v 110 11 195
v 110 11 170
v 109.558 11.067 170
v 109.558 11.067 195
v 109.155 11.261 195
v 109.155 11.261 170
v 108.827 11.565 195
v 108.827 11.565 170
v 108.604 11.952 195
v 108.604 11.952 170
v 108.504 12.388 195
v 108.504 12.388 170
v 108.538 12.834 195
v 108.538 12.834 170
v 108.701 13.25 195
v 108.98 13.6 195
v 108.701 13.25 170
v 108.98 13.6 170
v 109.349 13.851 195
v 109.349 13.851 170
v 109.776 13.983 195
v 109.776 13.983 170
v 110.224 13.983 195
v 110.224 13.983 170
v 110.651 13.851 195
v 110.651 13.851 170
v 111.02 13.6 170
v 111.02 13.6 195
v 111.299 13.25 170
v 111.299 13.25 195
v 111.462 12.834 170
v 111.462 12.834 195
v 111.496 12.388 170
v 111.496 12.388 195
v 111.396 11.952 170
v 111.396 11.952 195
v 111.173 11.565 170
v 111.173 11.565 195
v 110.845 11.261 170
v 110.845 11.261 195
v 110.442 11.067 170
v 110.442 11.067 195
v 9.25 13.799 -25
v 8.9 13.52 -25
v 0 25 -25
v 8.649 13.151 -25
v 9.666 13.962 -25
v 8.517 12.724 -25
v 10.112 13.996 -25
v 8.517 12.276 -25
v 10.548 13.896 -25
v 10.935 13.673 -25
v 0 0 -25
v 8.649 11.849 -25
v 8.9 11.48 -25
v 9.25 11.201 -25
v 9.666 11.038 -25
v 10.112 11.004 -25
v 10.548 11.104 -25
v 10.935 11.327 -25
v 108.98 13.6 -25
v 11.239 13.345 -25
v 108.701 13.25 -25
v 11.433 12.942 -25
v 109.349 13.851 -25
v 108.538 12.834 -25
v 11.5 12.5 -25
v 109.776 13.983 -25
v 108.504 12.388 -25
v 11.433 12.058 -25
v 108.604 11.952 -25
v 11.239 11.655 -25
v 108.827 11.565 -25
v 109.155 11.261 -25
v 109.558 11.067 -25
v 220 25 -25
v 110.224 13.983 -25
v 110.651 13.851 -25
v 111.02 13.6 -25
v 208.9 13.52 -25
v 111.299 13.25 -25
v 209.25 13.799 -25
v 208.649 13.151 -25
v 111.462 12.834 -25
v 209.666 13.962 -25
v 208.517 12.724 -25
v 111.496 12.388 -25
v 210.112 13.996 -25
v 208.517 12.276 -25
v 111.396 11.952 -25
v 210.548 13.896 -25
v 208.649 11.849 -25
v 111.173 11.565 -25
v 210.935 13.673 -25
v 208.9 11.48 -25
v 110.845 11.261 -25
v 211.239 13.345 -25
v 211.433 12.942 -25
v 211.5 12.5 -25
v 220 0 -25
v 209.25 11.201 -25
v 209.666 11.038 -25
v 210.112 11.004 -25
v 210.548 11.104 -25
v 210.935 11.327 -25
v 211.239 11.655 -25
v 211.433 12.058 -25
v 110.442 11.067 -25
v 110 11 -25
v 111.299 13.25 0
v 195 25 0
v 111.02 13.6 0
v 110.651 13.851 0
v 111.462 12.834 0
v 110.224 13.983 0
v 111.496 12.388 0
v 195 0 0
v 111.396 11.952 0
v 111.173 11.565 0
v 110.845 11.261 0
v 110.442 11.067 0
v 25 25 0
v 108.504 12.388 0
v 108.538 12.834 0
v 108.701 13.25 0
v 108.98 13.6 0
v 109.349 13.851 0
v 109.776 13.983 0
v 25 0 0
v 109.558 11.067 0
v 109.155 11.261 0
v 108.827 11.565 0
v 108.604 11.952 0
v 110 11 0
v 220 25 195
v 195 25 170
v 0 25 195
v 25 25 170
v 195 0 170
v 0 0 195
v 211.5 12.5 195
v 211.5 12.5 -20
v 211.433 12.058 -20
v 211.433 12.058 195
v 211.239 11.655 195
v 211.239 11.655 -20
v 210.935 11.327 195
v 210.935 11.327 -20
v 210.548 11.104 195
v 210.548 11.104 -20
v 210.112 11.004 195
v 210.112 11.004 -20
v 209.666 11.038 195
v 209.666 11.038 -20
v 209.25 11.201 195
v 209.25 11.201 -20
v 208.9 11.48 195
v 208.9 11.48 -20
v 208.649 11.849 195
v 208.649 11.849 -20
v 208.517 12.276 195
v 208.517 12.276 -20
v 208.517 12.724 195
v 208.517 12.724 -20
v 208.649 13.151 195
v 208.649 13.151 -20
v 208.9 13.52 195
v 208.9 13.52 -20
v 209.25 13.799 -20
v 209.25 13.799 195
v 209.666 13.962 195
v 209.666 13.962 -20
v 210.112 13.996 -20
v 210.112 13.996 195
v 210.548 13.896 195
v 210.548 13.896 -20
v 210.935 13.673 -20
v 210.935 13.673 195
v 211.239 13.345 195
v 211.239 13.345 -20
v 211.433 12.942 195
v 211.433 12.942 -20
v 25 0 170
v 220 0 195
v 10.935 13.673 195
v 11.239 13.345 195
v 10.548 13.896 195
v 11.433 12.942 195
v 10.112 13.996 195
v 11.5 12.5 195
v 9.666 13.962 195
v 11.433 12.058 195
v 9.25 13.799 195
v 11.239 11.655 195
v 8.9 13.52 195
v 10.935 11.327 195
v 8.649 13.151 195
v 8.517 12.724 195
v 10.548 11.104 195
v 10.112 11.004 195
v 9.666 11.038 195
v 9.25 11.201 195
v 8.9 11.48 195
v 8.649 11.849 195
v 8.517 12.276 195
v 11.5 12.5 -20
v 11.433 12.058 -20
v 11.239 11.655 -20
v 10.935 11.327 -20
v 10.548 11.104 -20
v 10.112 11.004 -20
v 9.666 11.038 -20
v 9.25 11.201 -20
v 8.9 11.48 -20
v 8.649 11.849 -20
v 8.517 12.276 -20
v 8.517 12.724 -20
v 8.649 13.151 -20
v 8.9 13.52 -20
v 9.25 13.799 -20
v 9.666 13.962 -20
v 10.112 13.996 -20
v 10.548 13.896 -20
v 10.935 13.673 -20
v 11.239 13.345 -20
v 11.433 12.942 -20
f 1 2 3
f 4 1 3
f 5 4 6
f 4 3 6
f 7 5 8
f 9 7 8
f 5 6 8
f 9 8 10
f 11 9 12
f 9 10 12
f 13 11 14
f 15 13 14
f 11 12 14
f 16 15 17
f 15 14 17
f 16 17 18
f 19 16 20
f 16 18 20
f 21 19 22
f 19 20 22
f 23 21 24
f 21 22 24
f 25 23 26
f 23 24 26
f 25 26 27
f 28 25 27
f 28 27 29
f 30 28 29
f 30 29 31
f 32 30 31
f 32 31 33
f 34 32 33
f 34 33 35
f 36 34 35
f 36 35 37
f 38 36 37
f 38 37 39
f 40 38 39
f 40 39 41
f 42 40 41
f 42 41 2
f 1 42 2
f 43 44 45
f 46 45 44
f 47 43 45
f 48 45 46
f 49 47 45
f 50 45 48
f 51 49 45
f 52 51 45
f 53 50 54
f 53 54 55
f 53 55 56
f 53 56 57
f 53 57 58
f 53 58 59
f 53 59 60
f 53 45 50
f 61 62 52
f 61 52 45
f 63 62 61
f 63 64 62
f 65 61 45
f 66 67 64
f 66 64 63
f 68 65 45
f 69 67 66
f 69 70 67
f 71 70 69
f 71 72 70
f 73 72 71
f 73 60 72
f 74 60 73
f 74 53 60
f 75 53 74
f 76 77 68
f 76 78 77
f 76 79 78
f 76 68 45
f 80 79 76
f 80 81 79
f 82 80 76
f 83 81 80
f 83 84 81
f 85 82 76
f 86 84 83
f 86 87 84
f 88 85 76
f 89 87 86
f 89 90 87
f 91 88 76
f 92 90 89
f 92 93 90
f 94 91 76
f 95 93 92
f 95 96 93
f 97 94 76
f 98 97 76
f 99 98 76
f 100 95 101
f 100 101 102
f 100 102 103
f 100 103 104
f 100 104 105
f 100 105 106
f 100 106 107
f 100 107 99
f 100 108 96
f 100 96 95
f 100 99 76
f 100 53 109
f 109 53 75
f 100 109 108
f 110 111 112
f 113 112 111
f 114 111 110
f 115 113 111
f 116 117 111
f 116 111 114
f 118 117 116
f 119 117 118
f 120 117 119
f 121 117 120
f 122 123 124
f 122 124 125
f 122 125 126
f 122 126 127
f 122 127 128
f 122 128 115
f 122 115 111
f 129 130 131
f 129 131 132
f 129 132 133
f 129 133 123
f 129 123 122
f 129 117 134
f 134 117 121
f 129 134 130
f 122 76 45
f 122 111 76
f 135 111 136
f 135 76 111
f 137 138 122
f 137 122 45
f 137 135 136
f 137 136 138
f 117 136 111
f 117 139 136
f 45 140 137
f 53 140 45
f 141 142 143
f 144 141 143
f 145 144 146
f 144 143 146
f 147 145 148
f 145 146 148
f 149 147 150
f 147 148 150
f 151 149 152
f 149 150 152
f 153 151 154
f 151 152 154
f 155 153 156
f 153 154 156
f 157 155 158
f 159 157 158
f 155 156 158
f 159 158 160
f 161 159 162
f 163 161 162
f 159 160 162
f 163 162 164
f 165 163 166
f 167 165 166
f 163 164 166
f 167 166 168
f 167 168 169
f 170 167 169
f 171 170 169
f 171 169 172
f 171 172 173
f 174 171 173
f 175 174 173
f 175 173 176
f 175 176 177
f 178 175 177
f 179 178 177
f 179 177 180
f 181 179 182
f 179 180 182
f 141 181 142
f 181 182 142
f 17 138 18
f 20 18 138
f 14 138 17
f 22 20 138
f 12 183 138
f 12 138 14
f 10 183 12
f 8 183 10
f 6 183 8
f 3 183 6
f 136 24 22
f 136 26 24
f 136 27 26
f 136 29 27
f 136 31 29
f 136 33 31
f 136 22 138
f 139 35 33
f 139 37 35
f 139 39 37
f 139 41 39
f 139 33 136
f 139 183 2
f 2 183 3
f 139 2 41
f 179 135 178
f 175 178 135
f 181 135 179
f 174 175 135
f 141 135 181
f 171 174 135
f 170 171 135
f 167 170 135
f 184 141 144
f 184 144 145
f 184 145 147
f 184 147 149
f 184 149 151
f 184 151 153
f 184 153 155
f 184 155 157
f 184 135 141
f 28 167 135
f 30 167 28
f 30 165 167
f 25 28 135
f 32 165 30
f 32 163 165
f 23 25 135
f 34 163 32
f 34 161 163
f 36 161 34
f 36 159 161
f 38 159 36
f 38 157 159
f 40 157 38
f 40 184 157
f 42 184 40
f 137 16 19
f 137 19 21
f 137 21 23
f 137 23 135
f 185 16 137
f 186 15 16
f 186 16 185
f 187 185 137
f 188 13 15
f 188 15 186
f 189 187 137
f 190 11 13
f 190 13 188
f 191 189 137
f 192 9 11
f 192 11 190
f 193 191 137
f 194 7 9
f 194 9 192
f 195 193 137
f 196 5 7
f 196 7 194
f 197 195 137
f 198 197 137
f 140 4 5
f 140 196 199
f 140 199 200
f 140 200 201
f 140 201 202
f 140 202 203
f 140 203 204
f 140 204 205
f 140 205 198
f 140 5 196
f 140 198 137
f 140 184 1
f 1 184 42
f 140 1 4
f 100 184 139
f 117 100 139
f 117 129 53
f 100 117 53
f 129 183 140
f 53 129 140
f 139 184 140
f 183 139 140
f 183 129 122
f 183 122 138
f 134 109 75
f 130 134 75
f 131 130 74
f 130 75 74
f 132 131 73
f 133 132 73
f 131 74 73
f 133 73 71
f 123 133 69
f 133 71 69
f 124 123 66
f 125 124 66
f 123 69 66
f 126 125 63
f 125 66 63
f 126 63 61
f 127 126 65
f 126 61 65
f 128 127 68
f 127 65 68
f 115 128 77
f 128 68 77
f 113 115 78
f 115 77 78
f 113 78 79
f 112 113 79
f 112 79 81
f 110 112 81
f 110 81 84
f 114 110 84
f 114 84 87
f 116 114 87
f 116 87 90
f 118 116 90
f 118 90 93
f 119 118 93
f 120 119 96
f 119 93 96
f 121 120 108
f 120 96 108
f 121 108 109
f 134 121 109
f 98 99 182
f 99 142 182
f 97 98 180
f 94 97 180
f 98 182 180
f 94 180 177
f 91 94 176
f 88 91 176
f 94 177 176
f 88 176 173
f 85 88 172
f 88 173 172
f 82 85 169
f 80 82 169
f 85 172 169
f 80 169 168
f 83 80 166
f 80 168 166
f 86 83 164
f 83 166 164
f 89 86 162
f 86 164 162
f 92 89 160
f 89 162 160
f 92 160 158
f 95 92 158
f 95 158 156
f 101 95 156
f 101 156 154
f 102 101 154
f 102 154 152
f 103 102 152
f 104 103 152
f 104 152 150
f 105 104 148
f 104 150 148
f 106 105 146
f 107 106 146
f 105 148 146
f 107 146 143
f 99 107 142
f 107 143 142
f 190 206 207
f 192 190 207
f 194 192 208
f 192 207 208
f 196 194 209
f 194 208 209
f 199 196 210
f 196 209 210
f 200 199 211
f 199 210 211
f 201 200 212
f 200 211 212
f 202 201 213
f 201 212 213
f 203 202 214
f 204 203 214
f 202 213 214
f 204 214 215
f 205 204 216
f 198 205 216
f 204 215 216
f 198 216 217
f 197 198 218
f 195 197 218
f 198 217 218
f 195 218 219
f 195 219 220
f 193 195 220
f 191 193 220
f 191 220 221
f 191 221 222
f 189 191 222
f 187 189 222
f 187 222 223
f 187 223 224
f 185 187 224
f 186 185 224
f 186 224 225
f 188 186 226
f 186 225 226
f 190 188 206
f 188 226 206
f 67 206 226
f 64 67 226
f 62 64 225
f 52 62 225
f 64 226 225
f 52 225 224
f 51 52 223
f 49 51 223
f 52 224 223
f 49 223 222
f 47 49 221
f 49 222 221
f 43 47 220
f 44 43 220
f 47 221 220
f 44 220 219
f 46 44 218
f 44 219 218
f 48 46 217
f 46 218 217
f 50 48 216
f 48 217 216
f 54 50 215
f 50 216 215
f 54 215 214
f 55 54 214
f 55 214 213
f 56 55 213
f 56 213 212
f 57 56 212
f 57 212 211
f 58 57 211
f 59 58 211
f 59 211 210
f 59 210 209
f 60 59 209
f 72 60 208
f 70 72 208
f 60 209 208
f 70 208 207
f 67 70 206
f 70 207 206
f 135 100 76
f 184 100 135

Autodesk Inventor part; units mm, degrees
ref_plane "YZ Plane" through (0, 0, 0) normal (1, 0, 0) x (0, 1, 0)
ref_plane "XZ Plane" through (0, 0, 0) normal (0, 1, 0) x (-1, 0, 0)
sketch "Sketch1" plane through (0, 0, 0) normal (0, 1, 0) x (-1, 0, 0)
  line L0 (0, 170) -> (0, 0)
  line L1 (-195, -25) -> (-25, -25)
  line L2 (-220, 0) -> (-220, 170)
  line L3 (-25, 195) -> (-195, 195)
  line L4 (-25, 195) -> (0, 195)
  line L5 (0, 195) -> (0, 170)
  line L6 (0, 0) -> (0, -25)
  line L7 (0, -25) -> (-25, -25)
  line L8 (-195, -25) -> (-220, -25)
  line L9 (-220, -25) -> (-220, 0)
  line L10 (-220, 170) -> (-220, 195)
  line L11 (-195, 195) -> (-220, 195)
  line L12 (-25, 170) -> (-195, 170)
  line L13 (-195, 170) -> (-195, 0)
  line L14 (-195, 0) -> (-25, 0)
  line L15 (-25, 0) -> (-25, 170)
  line L16 (-25, 170) -> (-195, 0) construction
  line L17 (-195, 170) -> (-25, 0) construction
  point P0 (-110, 85)
  dimension "d2" = 170
  dimension "d5" = 170
  dimension "d7" = 170
  dimension "d8" = 170
extrude "Extrusion1" add sketch "Sketch1" along normal blind 25
ref_plane "Work Plane1" through (0, 0, -20) normal (0, 0, 1) x (1, 0, 0)
sketch "Sketch2" plane through (0, 0, -20) normal (0, 0, 1) x (1, 0, 0)
  line L0 (0, 0) -> (0, 25) projected
  circle A0 centre (10, 12.5) radius 1.5
  line L1 (220, 0) -> (220, 25) projected
  circle A1 centre (210, 12.5) radius 1.5
extrude "Extrusion2" cut sketch "Sketch2" along normal through all both and the other way through all
sketch "Sketch3" plane through (0, 0, 195) normal (0, 0, 1) x (1, 0, 0)
  line L0 (195, 25) -> (25, 25) projected
  circle A0 centre (110, 12.5) radius 1.5
hole "Hole1" at (110, 12.5, 195) direction (0, 0, -1) diameter 3 end through all
properties part number "sambung kotak"
